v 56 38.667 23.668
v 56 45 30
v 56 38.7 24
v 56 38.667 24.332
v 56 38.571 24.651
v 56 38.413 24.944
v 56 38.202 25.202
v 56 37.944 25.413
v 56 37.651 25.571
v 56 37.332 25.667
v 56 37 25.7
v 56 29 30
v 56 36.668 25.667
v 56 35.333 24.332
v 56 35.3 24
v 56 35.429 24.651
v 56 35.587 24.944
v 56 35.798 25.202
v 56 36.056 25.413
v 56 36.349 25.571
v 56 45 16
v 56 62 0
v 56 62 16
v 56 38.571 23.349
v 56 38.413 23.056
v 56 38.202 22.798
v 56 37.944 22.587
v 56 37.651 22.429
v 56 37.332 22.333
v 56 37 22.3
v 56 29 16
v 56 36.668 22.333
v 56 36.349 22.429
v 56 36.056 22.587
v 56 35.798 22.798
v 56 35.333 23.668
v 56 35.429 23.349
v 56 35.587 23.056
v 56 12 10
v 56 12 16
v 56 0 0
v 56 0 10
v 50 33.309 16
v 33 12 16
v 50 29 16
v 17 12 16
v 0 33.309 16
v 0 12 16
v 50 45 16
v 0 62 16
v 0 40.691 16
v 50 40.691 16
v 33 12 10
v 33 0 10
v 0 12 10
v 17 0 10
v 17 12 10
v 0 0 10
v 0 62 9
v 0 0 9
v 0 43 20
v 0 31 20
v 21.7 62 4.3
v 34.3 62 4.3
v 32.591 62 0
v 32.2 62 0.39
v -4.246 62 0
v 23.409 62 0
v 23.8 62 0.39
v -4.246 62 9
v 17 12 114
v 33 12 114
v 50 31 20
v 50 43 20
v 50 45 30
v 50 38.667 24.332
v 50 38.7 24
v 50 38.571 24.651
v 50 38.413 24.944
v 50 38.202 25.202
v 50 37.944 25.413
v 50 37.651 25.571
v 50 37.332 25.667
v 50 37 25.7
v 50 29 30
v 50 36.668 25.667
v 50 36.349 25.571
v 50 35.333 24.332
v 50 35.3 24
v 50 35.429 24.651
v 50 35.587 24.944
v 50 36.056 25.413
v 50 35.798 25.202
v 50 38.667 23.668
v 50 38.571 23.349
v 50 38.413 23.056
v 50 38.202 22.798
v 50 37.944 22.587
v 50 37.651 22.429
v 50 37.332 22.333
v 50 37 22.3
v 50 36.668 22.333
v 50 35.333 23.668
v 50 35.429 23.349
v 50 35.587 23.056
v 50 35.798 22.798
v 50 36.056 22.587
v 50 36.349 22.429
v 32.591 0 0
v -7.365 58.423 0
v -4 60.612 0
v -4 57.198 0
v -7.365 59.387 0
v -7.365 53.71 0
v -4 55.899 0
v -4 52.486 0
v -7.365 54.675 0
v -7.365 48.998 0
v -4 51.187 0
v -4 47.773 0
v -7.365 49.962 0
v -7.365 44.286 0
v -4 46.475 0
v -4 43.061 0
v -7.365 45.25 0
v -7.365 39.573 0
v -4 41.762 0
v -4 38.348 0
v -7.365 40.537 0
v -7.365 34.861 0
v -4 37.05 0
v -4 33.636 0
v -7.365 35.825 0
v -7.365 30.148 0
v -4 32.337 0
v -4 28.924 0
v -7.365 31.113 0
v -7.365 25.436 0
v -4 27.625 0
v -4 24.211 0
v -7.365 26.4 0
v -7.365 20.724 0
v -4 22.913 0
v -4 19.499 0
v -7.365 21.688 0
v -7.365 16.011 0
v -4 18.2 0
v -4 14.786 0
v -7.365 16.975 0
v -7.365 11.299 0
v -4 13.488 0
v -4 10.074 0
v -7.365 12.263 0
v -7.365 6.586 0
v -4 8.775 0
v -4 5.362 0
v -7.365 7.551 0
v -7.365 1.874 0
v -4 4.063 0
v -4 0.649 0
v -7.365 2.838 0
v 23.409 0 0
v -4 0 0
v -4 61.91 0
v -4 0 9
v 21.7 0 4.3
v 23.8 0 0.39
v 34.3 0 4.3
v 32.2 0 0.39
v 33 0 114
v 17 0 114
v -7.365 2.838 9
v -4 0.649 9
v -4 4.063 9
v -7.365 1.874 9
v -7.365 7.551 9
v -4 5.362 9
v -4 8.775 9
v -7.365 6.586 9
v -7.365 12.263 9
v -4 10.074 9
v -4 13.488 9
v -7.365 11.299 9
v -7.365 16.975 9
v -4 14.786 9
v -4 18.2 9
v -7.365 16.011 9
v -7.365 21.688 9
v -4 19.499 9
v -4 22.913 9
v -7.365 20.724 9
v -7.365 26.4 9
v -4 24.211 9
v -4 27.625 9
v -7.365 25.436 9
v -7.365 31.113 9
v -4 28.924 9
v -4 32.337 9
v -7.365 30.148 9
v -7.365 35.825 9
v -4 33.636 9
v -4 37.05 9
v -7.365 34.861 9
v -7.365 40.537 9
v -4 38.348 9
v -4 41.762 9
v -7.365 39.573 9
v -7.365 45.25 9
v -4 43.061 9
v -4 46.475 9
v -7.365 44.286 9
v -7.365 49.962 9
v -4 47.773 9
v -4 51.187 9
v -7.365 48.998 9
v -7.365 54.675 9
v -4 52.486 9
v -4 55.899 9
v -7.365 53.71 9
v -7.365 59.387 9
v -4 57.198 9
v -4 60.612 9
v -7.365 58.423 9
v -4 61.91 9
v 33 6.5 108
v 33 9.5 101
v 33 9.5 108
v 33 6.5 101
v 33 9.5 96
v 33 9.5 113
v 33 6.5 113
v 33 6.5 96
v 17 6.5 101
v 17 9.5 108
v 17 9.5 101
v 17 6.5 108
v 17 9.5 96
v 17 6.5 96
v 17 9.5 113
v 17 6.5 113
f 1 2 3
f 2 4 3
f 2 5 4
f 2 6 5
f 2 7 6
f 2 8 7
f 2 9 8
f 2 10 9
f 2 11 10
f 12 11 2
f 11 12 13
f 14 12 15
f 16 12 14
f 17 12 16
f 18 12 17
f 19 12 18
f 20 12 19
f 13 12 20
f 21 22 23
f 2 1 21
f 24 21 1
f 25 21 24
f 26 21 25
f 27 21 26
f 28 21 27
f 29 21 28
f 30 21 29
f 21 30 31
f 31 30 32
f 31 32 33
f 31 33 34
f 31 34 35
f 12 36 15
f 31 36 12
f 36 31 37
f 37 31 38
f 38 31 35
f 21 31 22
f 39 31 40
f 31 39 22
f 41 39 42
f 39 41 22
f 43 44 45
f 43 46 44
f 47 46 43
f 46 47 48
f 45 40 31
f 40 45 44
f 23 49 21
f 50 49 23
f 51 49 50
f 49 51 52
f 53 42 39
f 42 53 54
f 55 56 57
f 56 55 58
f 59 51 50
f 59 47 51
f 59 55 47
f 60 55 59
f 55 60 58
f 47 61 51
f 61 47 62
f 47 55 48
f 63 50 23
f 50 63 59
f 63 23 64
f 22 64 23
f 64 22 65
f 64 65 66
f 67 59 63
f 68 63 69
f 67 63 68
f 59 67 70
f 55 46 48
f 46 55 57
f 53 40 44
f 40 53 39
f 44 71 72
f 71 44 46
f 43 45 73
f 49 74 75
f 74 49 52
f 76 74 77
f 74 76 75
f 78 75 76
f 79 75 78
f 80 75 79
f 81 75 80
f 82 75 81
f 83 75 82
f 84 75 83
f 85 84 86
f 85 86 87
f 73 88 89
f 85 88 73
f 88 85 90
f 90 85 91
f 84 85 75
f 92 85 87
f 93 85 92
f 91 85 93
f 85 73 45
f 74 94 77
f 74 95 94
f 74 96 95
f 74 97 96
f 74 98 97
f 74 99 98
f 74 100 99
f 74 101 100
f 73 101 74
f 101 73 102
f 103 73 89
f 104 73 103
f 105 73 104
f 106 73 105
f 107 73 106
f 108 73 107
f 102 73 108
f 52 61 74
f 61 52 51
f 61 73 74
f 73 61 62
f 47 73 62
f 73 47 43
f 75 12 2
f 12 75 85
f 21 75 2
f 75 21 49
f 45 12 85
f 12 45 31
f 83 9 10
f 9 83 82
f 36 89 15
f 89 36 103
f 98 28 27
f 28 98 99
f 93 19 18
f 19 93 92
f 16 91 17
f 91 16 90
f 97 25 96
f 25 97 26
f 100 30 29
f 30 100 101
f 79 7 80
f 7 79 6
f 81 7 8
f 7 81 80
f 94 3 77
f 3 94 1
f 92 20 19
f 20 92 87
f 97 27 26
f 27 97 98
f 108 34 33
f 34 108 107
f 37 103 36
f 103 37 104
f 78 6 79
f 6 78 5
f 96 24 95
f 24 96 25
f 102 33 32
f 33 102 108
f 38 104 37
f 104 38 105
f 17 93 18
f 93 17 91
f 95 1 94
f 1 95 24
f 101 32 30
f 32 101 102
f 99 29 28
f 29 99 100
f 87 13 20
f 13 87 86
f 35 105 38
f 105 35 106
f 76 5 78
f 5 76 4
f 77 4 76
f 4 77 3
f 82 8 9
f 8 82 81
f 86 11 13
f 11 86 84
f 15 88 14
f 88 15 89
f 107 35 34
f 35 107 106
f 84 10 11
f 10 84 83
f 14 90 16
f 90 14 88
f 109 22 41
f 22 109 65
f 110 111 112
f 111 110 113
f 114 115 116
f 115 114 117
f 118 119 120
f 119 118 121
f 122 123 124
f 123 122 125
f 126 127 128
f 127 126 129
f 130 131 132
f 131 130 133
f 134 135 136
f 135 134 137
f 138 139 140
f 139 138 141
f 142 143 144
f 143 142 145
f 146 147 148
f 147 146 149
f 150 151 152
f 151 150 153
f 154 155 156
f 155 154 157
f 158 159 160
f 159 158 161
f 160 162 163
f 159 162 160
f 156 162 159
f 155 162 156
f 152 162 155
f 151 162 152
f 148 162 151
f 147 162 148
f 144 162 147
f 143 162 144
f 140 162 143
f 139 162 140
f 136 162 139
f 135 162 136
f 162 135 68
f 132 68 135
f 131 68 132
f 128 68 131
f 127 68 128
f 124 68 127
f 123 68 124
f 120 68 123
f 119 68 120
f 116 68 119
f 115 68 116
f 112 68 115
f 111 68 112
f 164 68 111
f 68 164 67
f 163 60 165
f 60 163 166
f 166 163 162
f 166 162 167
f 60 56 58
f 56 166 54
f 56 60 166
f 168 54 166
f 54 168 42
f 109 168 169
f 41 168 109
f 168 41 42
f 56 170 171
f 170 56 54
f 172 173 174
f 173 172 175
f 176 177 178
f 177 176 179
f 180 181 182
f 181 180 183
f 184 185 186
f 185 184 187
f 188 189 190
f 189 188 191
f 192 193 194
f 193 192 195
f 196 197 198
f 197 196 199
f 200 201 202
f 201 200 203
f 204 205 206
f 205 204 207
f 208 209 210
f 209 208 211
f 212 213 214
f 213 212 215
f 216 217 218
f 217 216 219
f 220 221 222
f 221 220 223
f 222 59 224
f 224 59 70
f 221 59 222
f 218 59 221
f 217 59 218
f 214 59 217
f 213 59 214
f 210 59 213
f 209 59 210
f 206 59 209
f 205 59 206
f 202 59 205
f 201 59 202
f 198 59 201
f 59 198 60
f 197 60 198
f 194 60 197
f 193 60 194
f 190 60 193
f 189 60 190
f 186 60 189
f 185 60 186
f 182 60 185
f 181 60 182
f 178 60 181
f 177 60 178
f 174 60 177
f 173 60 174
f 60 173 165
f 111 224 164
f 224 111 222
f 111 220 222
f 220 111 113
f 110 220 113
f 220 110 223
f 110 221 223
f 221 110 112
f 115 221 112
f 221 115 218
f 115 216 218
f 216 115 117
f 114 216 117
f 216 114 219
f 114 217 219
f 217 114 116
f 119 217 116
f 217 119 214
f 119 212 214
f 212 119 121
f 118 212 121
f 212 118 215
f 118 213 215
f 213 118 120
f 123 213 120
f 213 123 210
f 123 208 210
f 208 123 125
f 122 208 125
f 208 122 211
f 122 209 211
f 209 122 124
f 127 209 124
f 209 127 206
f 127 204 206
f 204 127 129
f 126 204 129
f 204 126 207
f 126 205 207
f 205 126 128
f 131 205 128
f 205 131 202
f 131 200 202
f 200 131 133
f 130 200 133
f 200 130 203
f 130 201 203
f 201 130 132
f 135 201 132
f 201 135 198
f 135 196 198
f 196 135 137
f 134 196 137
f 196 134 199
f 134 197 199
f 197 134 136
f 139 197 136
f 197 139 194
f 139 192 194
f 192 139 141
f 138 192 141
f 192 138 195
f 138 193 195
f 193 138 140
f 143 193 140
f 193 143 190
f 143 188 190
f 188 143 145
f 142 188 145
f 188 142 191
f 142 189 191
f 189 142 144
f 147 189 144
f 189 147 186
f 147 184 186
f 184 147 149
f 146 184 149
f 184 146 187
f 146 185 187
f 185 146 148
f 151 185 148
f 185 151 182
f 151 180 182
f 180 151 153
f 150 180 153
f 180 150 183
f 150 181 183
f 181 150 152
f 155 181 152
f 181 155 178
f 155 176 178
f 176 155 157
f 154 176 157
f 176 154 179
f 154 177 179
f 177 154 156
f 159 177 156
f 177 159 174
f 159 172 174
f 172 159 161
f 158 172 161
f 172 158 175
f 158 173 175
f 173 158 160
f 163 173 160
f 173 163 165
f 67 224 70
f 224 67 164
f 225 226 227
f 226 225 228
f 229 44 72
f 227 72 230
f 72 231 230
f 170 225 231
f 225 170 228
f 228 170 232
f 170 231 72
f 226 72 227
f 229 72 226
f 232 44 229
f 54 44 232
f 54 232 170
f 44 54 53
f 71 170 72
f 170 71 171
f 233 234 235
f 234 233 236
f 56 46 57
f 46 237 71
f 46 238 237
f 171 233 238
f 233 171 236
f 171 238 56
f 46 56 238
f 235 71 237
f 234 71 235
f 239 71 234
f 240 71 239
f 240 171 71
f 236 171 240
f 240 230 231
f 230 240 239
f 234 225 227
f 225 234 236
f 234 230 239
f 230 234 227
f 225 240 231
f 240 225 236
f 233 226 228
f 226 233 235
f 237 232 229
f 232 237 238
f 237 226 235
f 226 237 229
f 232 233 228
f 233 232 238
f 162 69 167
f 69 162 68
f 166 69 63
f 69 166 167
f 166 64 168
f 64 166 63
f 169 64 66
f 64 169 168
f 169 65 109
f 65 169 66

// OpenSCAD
// Y carriage: Y rack, the male stage's base (plate, dovetail rail, X adjust
// tab) built in on top, cable pillar. Print as shown (slot down). Qty 1.
include <../axes.scad>
translate([-yc_x0, -yc_y0, -yc_z0]) y_carriage();
